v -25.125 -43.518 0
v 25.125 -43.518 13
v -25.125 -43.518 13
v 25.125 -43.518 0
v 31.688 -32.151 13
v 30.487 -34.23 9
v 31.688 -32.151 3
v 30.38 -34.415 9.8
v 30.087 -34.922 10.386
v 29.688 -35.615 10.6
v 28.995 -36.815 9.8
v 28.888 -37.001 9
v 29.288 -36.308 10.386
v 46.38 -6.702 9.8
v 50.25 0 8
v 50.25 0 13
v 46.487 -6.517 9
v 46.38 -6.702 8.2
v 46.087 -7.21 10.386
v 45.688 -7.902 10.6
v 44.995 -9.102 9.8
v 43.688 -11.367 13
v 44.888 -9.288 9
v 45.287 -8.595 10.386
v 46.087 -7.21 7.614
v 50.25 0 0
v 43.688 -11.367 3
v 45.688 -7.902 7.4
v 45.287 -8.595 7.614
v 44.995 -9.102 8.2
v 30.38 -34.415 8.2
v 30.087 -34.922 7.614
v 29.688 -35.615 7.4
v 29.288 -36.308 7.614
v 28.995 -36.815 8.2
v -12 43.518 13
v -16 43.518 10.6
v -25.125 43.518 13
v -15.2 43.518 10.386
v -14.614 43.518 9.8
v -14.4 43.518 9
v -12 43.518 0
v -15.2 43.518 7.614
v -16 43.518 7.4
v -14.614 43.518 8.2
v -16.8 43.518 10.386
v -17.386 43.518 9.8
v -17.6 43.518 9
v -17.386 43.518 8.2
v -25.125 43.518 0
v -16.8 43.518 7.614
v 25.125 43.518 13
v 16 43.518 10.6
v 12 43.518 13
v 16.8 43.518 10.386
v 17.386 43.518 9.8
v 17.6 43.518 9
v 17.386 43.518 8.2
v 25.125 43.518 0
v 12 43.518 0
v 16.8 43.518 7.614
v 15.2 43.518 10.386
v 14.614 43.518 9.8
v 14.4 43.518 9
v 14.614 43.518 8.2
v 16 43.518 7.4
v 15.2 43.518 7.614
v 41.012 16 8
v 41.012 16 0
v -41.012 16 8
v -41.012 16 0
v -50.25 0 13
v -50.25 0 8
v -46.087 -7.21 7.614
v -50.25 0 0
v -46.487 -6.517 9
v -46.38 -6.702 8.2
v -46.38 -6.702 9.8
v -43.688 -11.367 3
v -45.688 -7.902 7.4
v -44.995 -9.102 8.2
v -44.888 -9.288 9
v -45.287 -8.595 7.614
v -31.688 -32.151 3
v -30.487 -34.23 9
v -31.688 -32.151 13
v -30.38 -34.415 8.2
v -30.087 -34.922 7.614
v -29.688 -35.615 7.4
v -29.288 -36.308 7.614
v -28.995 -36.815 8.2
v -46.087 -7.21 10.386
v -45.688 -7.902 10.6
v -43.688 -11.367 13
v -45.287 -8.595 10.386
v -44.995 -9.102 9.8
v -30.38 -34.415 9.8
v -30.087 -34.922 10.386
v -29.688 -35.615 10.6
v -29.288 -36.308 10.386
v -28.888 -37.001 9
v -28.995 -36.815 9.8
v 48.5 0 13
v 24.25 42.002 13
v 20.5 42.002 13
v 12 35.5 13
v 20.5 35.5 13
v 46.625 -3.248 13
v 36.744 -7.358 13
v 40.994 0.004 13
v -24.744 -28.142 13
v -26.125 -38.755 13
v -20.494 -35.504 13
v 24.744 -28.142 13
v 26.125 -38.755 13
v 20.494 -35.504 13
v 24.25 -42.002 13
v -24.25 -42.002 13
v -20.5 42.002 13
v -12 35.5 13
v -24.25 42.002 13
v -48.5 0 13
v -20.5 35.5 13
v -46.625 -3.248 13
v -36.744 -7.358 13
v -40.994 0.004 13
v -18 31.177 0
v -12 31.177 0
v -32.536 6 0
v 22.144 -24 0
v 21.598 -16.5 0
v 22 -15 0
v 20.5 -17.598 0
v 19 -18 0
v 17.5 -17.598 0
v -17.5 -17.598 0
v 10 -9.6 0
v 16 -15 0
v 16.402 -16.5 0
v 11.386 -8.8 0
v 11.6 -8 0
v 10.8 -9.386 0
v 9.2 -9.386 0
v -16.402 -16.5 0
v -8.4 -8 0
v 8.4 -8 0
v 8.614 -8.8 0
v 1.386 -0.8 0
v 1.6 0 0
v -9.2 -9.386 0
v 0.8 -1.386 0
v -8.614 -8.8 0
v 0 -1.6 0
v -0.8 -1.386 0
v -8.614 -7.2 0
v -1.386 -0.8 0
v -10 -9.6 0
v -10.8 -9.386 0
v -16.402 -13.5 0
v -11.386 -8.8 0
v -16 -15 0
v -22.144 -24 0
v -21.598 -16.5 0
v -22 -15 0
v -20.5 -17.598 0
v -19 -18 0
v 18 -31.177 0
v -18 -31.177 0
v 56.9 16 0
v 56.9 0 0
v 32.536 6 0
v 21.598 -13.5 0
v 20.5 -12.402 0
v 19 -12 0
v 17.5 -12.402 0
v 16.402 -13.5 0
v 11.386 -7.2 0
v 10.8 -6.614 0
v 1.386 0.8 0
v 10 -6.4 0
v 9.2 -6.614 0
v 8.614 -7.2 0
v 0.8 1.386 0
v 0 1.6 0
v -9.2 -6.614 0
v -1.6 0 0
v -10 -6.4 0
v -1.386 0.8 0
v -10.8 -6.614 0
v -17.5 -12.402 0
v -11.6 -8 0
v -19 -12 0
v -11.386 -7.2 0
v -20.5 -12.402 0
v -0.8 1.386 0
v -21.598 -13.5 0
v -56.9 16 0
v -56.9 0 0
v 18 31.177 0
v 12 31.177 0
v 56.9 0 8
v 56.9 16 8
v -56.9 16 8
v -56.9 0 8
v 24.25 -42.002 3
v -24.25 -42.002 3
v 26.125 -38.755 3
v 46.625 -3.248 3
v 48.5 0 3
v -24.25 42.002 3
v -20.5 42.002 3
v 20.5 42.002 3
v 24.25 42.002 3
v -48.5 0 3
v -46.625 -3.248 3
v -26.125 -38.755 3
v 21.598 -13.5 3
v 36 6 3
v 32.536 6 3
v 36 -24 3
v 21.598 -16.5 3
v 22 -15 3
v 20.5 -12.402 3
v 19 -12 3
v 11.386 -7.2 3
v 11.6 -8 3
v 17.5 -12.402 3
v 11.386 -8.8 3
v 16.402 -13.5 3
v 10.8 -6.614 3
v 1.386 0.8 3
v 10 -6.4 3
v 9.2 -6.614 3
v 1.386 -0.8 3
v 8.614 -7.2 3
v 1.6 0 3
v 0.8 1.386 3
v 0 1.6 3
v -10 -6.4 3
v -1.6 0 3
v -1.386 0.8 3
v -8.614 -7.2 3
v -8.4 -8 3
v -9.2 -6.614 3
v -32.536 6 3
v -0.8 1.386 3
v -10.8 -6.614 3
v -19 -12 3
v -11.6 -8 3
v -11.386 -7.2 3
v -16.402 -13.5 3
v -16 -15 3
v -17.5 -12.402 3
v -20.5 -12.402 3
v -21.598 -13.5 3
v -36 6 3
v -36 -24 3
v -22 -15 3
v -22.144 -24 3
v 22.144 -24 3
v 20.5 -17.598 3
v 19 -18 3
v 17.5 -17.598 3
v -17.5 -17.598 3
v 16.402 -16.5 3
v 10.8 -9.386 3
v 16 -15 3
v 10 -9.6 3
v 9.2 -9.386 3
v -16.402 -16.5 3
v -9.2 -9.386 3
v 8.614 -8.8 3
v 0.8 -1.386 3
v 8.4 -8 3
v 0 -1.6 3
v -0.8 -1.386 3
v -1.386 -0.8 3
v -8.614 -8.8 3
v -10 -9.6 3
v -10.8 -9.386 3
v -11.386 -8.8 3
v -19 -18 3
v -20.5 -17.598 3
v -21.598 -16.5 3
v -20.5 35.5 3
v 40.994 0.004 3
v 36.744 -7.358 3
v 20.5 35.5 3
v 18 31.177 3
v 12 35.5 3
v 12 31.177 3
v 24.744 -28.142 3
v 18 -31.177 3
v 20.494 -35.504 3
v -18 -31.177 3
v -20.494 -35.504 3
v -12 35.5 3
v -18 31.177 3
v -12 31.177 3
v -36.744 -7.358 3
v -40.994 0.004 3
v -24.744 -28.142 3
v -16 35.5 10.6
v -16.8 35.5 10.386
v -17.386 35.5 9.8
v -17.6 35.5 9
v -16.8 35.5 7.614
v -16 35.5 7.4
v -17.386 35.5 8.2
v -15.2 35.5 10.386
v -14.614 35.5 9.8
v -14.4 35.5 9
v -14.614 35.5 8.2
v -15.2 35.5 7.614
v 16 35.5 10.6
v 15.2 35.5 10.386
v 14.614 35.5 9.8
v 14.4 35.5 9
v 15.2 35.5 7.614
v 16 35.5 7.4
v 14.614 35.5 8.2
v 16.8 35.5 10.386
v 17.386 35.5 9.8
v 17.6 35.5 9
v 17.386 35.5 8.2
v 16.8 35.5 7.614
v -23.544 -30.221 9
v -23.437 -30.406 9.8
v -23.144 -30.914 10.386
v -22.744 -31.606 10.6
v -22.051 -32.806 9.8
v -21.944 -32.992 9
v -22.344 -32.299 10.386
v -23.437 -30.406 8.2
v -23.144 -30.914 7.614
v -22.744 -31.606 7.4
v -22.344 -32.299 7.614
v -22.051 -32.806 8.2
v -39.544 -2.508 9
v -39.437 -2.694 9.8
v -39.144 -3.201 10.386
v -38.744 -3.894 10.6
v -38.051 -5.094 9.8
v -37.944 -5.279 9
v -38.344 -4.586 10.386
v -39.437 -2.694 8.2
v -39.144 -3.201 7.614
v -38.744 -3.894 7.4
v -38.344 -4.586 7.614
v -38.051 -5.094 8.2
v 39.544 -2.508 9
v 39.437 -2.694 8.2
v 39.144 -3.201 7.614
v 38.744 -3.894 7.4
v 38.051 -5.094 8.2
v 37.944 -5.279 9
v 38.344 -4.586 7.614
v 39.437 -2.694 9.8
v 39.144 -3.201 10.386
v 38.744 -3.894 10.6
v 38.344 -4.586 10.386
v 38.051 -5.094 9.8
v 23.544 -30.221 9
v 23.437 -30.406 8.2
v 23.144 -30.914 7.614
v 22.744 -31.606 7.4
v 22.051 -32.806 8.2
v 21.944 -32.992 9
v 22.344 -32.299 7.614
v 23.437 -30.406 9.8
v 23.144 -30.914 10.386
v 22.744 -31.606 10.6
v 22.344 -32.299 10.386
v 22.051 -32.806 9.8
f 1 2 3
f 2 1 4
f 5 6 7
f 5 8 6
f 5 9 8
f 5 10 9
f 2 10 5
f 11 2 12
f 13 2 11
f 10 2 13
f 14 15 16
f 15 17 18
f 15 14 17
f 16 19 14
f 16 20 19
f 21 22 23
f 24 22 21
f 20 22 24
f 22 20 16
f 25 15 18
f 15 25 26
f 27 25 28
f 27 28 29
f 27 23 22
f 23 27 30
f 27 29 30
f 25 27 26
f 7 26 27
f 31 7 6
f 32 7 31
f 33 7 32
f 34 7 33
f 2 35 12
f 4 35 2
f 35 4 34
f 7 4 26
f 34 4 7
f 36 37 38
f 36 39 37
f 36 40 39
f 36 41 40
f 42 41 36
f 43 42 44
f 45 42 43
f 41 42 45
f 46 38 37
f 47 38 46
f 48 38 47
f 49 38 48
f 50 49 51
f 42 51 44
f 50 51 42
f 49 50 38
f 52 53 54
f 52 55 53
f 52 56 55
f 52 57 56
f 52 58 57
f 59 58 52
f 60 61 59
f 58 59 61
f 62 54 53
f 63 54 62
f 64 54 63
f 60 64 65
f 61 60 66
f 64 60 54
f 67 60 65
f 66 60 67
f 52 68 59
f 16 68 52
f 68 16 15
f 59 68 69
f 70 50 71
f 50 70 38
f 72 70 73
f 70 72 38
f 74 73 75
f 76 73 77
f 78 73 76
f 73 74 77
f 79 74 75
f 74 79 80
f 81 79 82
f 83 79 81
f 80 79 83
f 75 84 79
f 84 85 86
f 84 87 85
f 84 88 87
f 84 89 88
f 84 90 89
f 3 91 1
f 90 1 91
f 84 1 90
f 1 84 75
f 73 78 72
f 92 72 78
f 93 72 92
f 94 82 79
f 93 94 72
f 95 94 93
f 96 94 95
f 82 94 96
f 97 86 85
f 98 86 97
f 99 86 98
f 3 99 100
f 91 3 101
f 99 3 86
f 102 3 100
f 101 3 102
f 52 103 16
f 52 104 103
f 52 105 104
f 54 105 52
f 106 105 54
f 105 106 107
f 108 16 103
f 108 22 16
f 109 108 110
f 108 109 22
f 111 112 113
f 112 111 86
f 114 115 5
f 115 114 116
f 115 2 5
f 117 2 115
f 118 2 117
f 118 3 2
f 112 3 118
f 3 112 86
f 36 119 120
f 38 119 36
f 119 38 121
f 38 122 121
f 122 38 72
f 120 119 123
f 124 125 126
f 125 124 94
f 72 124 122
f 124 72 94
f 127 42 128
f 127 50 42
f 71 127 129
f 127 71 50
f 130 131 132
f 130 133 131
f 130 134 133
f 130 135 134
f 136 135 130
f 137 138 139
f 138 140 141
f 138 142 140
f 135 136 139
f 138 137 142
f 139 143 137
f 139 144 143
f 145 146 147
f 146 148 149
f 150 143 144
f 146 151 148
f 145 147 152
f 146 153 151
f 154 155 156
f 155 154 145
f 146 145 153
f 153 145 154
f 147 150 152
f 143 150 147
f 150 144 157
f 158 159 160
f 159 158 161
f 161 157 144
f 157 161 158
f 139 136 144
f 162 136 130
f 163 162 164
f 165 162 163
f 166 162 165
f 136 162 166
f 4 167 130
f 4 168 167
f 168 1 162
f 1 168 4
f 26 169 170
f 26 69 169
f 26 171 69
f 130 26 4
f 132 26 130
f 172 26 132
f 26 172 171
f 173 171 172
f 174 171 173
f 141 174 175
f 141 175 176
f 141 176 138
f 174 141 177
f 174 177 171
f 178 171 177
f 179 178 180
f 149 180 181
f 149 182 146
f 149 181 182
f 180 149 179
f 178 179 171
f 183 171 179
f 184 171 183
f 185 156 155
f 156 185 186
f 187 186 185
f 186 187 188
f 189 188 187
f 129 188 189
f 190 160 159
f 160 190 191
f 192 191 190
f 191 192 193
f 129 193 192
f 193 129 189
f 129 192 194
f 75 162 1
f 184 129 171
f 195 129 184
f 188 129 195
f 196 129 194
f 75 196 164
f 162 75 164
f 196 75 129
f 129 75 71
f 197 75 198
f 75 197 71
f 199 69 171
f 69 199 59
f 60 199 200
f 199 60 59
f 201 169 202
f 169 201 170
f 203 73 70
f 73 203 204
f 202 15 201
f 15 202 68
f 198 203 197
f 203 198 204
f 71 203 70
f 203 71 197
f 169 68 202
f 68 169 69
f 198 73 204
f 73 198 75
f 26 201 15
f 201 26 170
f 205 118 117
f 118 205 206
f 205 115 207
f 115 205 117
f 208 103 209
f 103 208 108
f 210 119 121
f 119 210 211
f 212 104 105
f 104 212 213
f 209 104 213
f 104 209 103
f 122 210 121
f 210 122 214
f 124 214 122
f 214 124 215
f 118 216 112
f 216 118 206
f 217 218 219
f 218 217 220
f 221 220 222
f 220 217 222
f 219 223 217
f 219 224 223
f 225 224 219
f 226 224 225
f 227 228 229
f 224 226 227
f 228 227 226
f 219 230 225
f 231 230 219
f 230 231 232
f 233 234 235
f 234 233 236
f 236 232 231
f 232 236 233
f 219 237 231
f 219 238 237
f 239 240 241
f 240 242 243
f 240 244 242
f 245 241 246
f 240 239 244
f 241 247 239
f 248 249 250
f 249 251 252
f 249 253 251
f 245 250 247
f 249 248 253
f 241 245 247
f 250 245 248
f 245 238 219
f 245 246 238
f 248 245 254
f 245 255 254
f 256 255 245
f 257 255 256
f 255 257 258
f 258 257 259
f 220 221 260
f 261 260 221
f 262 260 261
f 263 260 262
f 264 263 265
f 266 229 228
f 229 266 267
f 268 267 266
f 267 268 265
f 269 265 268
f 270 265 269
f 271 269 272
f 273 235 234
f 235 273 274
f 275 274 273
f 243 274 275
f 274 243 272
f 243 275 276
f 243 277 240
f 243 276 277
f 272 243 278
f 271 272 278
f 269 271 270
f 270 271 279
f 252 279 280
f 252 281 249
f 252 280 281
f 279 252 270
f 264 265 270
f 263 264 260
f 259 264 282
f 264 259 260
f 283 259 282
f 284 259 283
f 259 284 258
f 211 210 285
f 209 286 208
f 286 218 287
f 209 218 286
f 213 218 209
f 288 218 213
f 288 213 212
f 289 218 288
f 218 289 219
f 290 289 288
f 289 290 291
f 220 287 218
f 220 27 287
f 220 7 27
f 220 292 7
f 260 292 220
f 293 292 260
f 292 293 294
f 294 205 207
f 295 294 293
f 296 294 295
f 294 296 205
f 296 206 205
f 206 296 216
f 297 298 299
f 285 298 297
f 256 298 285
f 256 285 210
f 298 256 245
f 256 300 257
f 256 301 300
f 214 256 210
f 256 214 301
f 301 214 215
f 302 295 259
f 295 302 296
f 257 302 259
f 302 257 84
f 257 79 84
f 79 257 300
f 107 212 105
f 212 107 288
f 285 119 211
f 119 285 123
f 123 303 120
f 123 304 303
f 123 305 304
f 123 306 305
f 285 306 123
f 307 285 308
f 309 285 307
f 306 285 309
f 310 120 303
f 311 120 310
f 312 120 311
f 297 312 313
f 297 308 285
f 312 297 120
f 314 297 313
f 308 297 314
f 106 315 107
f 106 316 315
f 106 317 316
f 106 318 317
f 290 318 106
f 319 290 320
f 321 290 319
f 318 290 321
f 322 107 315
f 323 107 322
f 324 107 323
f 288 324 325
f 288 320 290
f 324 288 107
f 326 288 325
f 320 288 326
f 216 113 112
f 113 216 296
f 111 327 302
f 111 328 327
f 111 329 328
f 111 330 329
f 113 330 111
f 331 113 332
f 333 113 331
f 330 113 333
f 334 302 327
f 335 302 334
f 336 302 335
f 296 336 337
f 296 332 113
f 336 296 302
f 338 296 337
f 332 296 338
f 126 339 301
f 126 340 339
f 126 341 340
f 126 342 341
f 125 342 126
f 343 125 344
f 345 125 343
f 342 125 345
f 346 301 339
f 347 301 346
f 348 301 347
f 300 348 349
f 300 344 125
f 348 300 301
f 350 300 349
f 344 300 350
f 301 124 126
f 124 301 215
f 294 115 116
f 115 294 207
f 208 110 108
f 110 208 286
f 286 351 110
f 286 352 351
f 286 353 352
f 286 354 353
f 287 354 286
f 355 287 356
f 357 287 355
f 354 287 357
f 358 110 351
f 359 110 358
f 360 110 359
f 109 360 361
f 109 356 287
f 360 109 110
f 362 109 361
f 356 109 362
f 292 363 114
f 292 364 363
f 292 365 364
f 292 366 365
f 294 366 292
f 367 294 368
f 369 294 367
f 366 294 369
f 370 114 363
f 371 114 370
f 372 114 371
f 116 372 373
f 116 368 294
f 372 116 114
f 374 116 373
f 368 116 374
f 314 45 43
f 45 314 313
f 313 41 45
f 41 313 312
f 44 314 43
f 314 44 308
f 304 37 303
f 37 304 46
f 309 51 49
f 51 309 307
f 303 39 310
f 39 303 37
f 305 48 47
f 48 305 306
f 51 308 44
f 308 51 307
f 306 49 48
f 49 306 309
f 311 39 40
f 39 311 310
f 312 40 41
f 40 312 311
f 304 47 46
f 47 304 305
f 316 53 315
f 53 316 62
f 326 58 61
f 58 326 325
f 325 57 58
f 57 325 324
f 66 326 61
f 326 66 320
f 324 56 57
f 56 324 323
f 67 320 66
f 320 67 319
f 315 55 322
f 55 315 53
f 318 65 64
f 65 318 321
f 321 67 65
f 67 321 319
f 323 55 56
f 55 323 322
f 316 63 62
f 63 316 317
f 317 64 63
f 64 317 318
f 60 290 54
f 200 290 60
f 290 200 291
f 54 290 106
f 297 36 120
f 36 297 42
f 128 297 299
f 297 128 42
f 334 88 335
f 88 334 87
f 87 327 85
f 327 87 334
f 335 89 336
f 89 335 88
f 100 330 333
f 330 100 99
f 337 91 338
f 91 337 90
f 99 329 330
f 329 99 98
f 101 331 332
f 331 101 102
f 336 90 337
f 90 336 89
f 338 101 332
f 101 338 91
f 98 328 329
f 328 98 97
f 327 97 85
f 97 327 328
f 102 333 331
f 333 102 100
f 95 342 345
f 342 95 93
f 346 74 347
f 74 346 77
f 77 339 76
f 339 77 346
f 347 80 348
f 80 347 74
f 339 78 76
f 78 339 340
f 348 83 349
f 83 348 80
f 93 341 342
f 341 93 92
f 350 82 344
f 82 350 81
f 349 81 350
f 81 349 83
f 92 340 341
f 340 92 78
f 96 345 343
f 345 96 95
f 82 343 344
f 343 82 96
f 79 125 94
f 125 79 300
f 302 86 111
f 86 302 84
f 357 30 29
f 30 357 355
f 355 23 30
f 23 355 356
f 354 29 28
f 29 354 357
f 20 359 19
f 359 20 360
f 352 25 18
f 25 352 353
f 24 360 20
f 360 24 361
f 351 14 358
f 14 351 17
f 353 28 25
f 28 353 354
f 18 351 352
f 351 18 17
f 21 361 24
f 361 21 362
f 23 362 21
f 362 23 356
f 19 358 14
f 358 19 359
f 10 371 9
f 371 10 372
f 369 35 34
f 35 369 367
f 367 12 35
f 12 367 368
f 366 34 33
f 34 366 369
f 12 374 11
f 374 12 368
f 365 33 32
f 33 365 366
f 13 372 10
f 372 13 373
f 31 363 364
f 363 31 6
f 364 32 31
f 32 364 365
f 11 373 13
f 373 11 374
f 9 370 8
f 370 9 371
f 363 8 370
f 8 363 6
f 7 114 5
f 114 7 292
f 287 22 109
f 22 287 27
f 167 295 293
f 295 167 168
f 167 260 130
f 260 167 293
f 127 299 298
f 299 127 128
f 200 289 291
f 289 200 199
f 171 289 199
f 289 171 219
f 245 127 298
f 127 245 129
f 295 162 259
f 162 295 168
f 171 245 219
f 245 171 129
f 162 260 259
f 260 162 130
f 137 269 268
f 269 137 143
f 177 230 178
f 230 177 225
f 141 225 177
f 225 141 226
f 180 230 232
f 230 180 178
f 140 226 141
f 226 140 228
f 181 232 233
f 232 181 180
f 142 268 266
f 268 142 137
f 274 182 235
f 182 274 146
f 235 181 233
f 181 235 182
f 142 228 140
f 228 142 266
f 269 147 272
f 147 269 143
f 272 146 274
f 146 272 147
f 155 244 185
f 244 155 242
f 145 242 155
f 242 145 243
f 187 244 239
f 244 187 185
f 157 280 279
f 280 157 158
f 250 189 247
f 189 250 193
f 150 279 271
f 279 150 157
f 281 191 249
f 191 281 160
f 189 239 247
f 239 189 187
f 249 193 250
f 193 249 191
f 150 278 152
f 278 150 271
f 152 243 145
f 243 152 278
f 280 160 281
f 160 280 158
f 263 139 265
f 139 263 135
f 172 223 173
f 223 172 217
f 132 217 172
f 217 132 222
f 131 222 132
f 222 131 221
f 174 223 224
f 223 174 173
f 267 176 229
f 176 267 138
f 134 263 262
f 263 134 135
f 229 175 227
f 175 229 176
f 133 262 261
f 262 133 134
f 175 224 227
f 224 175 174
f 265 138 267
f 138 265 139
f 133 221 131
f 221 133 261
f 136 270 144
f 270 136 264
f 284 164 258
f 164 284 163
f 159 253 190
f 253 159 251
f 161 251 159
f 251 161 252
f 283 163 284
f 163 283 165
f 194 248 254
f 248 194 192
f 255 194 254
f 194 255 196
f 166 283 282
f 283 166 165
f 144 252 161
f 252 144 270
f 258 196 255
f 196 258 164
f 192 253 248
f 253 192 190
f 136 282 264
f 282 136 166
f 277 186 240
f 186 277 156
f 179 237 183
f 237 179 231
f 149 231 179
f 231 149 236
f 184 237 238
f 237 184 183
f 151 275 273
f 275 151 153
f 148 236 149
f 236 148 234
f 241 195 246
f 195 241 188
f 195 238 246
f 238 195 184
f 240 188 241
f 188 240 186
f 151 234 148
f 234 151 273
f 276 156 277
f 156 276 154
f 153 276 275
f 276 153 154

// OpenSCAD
$fn=12;
difference(){

union(){    
difference(){
union(){
cylinder(d=100.5,h=13,$fn=6);
translate([-56.9,0,0])cube([113.8,16,8]);
}
translate([0,0,3])cylinder(d=97,h=11,$fn=6);
}

    
for(i=[0:120:300]){
rotate([0,0,i])translate([0,39.5,7]) 
    cube([41,8,12],center=true);    
}
}
translate([0,0,-1])cylinder(d=72,h=14,$fn=6);    
    
for(i=[0:120:300]){
rotate([0,0,i]){
    translate([-16,0,9])rotate([-90,0,0])
    cylinder(d=3.2,h=100);
    translate([16,0,9])rotate([-90,0,0])
    cylinder(d=3.2,h=100);
    translate([-12,0,3])cube([24,120,11]);
}
}
translate([-12,0,-1])cube([24,120,11]);
}

difference(){
translate([0,-9,1.5])cube([72,30,3],center=true);
translate([10,-8,-1])cylinder(d=3.2,h=5);
translate([-10,-8,-1])cylinder(d=3.2,h=5);
translate([19,-15,-1])cylinder(d=6,h=5);
translate([-19,-15,-1])cylinder(d=6,h=5);
cylinder(d=3.2,h=4);    
}
